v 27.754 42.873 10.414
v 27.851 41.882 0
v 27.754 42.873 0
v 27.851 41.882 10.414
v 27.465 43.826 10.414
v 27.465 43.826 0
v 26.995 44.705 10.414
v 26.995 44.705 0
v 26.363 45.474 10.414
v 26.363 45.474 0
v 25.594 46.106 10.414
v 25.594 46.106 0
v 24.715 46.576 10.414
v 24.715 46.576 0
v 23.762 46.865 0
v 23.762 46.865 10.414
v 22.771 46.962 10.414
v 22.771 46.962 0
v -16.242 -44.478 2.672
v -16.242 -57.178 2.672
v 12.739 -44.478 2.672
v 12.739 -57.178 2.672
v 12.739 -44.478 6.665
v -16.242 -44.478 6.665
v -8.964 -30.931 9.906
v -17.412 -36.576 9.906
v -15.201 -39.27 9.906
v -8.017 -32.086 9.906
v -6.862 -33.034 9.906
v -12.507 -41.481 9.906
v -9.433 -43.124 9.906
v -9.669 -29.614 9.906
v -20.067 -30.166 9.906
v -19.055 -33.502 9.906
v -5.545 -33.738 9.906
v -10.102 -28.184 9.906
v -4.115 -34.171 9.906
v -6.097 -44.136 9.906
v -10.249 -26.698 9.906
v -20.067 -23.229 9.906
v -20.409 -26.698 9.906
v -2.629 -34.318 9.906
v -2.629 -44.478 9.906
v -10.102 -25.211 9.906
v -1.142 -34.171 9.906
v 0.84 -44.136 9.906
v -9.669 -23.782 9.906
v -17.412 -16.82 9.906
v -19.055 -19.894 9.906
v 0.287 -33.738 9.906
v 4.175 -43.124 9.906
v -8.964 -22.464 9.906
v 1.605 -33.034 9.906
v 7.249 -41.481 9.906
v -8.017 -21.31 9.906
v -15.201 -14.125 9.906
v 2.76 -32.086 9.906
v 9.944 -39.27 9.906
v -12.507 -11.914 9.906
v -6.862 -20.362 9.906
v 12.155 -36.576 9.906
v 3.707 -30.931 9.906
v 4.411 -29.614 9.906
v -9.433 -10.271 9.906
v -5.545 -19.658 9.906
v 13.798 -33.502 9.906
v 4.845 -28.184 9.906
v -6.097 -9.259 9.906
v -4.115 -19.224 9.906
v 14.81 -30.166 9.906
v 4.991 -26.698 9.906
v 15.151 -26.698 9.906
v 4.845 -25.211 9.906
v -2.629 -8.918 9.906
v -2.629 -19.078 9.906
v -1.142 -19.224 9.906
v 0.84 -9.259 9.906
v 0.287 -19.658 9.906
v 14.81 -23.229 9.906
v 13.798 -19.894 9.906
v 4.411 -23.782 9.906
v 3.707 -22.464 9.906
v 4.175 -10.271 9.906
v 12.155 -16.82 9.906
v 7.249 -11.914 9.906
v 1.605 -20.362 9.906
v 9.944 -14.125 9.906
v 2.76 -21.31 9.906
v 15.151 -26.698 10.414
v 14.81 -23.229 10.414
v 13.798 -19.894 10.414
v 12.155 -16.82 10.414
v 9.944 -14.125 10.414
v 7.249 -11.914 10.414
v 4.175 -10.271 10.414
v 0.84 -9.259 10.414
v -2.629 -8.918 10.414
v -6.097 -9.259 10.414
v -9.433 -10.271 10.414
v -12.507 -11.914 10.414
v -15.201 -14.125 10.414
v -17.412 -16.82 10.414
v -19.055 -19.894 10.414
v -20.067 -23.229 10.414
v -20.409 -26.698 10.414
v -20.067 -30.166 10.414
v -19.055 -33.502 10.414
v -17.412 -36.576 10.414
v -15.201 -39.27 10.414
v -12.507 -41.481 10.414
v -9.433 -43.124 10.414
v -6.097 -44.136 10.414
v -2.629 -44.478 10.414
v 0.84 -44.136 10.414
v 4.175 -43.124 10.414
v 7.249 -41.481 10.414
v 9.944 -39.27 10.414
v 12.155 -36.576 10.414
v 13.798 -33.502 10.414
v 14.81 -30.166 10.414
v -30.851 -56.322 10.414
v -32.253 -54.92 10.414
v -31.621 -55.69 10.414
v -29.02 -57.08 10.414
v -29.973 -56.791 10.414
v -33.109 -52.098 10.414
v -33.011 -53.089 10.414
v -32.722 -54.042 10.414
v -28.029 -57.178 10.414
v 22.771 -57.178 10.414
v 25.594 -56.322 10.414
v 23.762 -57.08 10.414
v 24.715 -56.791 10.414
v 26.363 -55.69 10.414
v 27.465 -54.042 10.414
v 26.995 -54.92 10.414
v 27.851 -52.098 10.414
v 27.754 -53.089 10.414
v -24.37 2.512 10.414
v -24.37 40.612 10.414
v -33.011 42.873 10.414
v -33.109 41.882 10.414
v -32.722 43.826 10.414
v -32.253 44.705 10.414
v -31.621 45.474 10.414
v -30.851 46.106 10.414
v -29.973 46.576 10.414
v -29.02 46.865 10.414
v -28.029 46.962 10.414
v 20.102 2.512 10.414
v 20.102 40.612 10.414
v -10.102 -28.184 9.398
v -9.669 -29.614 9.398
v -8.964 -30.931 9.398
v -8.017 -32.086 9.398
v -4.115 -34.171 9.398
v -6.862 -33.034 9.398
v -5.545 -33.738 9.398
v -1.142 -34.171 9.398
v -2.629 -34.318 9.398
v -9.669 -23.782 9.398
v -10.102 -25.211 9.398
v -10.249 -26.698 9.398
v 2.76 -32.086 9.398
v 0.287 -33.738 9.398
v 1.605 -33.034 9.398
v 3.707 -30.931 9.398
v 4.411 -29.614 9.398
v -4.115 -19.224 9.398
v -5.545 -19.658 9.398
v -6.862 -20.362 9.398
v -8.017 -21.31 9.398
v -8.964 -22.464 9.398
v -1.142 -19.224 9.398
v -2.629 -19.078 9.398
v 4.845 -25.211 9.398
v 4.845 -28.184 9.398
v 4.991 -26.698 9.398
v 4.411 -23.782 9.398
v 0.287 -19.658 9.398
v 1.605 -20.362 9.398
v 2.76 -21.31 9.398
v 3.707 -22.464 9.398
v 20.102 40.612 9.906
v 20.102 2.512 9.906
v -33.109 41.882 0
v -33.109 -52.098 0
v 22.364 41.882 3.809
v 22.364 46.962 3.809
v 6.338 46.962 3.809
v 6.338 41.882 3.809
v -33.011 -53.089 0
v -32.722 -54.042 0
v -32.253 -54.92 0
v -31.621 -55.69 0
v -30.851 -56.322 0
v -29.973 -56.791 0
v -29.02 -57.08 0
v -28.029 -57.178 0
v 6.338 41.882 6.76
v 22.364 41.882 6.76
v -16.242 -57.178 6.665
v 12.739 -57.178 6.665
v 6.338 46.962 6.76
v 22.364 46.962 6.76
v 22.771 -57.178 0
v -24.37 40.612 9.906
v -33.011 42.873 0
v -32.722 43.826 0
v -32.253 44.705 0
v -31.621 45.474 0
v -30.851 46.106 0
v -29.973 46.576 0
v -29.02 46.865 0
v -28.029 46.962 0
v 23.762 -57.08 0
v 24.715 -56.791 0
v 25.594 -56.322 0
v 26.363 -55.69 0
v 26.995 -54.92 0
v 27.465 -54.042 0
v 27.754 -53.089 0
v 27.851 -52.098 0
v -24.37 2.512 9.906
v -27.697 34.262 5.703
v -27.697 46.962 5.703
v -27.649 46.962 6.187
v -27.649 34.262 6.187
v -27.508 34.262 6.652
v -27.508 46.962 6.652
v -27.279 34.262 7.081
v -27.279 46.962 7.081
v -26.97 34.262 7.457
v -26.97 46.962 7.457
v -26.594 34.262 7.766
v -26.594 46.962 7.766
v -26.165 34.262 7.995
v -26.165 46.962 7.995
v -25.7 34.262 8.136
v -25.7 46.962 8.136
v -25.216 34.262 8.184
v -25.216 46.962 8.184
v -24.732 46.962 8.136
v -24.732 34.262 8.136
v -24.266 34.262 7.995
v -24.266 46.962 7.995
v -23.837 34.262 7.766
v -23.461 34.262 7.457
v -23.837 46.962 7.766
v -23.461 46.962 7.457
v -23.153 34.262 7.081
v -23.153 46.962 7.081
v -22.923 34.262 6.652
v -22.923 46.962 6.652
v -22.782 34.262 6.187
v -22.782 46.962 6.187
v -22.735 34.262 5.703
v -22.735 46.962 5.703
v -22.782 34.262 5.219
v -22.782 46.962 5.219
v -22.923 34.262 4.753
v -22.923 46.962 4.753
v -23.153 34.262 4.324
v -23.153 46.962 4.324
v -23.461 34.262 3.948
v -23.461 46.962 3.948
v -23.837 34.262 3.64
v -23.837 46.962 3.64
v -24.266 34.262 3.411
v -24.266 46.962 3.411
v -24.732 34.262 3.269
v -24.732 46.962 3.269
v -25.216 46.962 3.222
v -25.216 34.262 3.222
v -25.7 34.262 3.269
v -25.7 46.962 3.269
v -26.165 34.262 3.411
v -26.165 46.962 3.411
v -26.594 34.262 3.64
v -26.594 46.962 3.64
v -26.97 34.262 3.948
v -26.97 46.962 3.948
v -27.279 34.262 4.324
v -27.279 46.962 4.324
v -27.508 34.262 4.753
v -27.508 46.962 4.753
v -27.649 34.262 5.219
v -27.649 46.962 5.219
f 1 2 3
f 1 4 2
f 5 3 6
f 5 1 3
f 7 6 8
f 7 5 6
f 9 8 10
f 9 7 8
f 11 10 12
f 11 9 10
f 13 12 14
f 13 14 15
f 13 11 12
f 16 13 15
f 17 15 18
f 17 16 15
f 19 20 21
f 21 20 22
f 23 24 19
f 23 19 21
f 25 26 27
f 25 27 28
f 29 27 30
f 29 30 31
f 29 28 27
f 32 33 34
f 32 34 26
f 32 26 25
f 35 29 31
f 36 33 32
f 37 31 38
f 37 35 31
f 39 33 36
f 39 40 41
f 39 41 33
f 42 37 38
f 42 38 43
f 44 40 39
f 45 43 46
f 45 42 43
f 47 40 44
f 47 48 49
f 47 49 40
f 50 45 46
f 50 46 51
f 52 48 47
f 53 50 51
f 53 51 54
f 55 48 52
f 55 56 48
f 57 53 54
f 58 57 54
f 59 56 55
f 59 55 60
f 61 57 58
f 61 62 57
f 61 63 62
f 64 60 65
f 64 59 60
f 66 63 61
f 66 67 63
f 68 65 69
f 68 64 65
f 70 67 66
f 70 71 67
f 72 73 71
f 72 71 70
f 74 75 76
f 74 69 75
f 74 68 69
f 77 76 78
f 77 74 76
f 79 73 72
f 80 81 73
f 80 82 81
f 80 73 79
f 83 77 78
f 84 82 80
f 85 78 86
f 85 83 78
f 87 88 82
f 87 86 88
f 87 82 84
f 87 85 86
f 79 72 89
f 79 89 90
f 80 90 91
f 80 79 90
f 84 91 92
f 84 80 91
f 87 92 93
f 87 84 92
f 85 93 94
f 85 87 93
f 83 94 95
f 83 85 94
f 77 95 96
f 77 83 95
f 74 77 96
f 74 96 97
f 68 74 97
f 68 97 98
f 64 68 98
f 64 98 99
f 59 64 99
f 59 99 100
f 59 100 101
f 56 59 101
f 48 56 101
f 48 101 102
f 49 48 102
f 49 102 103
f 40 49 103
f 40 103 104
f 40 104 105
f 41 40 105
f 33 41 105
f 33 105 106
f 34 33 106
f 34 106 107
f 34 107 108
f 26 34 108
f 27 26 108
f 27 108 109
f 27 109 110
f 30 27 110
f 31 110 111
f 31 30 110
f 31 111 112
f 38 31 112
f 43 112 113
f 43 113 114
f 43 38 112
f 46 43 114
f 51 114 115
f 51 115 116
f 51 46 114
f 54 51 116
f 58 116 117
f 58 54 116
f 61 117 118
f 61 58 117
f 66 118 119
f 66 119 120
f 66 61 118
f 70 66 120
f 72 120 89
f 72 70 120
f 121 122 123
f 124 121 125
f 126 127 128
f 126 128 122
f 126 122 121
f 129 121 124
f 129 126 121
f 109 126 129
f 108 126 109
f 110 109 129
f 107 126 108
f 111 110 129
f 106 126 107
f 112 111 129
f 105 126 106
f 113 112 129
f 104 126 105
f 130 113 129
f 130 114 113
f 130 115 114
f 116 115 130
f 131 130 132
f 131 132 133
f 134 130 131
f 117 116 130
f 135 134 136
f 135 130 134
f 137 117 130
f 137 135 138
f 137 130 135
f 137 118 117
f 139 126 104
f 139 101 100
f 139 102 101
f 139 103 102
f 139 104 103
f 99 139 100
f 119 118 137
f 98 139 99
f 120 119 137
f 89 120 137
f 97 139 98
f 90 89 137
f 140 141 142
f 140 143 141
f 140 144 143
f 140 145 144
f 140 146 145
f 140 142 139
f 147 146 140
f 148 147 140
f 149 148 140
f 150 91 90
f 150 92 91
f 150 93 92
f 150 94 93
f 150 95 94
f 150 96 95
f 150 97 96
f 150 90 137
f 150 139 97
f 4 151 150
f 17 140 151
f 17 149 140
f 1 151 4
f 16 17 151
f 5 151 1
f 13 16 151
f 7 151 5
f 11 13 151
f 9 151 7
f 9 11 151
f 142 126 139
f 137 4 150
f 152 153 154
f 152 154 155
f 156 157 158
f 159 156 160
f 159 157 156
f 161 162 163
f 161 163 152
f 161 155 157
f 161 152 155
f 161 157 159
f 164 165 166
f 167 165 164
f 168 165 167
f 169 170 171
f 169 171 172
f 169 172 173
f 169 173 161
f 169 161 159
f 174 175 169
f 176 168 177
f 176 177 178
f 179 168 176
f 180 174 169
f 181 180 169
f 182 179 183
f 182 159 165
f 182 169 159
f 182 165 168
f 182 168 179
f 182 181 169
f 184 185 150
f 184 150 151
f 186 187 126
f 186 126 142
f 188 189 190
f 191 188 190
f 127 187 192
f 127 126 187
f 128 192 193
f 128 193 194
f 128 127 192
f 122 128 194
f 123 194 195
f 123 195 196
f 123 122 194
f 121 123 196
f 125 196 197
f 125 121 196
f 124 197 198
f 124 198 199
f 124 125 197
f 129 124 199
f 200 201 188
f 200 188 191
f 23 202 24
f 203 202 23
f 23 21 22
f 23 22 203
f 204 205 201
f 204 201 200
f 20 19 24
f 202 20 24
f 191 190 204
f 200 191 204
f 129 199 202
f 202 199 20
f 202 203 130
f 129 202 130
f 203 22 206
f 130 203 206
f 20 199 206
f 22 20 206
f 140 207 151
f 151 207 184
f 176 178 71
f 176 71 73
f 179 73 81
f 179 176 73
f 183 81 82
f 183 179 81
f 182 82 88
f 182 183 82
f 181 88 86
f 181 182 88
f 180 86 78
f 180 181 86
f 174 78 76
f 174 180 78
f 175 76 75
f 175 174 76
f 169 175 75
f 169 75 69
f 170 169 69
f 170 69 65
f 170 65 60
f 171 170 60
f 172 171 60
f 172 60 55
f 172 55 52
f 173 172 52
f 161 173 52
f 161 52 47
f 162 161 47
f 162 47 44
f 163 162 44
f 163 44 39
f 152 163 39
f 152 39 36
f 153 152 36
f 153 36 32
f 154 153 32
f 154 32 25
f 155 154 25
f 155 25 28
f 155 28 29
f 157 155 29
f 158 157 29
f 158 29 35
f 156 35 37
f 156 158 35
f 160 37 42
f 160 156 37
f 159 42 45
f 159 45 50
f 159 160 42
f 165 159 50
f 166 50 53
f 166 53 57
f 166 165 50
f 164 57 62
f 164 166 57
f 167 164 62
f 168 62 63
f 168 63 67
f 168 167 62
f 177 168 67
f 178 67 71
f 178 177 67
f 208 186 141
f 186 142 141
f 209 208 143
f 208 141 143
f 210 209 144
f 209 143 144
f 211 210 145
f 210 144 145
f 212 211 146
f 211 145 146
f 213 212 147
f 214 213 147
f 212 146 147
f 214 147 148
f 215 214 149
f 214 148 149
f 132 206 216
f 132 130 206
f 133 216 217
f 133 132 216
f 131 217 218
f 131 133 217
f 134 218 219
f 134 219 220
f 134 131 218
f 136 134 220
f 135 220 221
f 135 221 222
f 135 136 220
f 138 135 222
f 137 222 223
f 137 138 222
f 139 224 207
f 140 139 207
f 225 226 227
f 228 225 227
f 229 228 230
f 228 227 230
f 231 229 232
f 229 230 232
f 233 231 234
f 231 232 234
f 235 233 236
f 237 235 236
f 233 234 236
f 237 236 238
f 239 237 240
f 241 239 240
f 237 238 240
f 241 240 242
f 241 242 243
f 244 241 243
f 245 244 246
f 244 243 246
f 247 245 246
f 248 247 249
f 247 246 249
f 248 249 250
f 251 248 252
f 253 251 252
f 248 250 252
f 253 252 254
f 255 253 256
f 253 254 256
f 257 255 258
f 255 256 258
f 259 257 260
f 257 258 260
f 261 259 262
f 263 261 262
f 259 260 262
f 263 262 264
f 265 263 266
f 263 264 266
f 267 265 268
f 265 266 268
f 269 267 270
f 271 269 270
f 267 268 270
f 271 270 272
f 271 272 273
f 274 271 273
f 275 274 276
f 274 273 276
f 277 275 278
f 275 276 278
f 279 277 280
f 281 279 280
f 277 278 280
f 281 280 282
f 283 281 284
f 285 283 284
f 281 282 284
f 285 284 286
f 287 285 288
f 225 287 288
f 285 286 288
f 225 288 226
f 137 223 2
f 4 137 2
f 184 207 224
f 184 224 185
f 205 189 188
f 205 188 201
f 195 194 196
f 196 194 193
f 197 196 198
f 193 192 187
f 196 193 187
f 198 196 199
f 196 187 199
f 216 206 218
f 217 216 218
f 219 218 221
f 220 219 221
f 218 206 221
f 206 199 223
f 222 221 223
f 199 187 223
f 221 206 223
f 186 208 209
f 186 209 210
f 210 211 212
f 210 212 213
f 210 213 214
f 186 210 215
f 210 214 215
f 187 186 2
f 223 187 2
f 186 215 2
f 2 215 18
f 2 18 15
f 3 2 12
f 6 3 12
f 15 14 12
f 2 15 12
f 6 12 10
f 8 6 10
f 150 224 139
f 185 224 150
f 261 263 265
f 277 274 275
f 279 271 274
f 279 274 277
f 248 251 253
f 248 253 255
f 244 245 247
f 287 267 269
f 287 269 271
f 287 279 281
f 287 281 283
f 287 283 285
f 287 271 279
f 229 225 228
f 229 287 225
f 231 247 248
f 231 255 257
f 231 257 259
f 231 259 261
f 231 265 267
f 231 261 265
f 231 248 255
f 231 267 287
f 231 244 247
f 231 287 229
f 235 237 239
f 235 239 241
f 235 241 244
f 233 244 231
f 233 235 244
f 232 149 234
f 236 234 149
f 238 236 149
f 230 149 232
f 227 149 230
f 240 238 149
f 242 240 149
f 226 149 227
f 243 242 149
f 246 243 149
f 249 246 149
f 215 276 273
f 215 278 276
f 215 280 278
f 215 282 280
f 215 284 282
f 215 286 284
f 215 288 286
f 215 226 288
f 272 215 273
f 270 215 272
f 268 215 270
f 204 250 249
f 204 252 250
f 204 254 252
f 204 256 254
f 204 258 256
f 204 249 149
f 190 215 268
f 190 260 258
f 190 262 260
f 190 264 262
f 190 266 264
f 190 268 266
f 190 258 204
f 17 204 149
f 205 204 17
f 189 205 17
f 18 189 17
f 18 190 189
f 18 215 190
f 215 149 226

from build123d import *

# Parameters (mm, degrees)
F0_W     = 60.96
F0_H     = 104.14
F0_R     = 17.78
F0_W_2   = 44.47266
F0_H_2   = 38.1
F1_DEPTH = 10.414
F0_R_2   = 7.62
F2_DEPTH = 9.906
F3_DEPTH = 9.398
F4_W     = 16.026364
F4_H     = 2.950886
F5_DEPTH = 5.08
F4_R     = 2.481019
F6_DEPTH = 12.7
F7_R     = 5.08
F8_W     = 28.981276
F8_H     = 3.993245
F9_DEPTH = 12.7


with BuildPart() as f1:
    # F0 (on Top) → F1 (new body)
    with BuildSketch(Plane.XY):
        with Locations((-2.628636, -5.107779)):
            Rectangle(F0_W, F0_H)
        with Locations((-2.628636, -26.697779)):
            Circle(F0_R, mode=Mode.SUBTRACT)
        with Locations((-2.133989, 21.562221)):
            Rectangle(F0_W_2, F0_H_2, mode=Mode.SUBTRACT)
    extrude(amount=F1_DEPTH)

    # F0 (on Top) → F2 (join)
    with BuildSketch(Plane.XY):
        with Locations((-2.133989, 21.562221)):
            Rectangle(F0_W_2, F0_H_2)
        with Locations((-2.628636, -26.697779)):
            Circle(F0_R)
        with Locations((-2.628636, -26.697779)):
            Circle(F0_R_2, mode=Mode.SUBTRACT)
    extrude(amount=F2_DEPTH)

    # F0 (on Top) → F3 (join)
    with BuildSketch(Plane.XY):
        with Locations((-2.628636, -26.697779)):
            Circle(F0_R_2)
    extrude(amount=F3_DEPTH)

    # F4 (on face) → F5 (cut)
    with BuildSketch(Plane(origin=(0, 46.962221, 0), x_dir=(-1, 0, 0), z_dir=(0, 1, 0))):
        with Locations((-14.351097, 5.28416)):
            Rectangle(F4_W, F4_H)
    extrude(amount=-F5_DEPTH, mode=Mode.SUBTRACT)

    # F4 (on face) → F6 (cut)
    with BuildSketch(Plane(origin=(0, 46.962221, 0), x_dir=(-1, 0, 0), z_dir=(0, 1, 0))):
        with Locations((25.215648, 5.702663)):
            Circle(F4_R)
    extrude(amount=-F6_DEPTH, mode=Mode.SUBTRACT)

    # F7
    f7_edges = [f1.edges().sort_by_distance(p)[0] for p in [
        (-33.108636, 46.962221, 5.207),
        (27.851364, 46.962221, 5.207),
        (27.851364, -57.177779, 5.207),
        (-33.108636, -57.177779, 5.207),
    ]]
    fillet(f7_edges, radius=F7_R)

    # F8 (on face) → F9 (cut)
    with BuildSketch(Plane.XZ.offset(57.177779)):
        with Locations((-1.75176, 4.668219)):
            Rectangle(F8_W, F8_H)
    extrude(amount=-F9_DEPTH, mode=Mode.SUBTRACT)


solid = f1.part
